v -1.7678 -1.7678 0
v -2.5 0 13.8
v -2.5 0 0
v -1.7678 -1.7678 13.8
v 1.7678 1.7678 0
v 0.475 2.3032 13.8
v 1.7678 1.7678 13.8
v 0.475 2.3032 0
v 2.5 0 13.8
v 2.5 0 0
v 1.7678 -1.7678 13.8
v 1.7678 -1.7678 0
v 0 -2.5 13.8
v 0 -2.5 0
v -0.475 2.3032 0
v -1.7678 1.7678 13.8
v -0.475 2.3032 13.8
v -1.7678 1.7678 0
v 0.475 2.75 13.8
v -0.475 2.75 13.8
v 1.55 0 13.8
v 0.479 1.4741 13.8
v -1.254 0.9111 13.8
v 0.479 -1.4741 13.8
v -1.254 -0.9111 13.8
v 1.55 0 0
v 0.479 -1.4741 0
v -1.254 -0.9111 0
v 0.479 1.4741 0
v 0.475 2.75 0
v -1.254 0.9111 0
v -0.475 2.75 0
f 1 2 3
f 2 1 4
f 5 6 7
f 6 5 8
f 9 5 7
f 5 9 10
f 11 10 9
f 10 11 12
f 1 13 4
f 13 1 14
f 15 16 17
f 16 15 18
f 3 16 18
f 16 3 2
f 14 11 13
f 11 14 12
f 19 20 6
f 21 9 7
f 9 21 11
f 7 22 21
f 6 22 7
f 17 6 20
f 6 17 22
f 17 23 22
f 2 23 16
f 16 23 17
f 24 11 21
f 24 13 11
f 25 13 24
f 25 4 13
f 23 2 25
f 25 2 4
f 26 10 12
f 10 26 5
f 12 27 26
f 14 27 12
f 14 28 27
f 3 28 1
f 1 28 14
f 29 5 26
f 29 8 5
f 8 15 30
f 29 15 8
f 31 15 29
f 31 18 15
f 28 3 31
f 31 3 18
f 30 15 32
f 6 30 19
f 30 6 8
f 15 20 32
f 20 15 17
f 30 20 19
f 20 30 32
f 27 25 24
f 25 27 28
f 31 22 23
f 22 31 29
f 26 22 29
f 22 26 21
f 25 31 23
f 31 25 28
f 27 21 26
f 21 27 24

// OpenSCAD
// 4mm*14mm M3 screw tubes

len_mm = 14;
wall_mm = 0.95;
inner_mm = 3.1;
d = wall_mm*2 + inner_mm;
t2 = 0.2;

difference() {
  union() {
    cylinder(len_mm - t2, d = inner_mm + wall_mm * 2);
    translate([-wall_mm/2, wall_mm, 0]) {
      cube([wall_mm, 2 - t2 , len_mm - t2]);
    }
  }
  cylinder(len_mm, r1 = inner_mm / 2, r2 = inner_mm / 2);
}
